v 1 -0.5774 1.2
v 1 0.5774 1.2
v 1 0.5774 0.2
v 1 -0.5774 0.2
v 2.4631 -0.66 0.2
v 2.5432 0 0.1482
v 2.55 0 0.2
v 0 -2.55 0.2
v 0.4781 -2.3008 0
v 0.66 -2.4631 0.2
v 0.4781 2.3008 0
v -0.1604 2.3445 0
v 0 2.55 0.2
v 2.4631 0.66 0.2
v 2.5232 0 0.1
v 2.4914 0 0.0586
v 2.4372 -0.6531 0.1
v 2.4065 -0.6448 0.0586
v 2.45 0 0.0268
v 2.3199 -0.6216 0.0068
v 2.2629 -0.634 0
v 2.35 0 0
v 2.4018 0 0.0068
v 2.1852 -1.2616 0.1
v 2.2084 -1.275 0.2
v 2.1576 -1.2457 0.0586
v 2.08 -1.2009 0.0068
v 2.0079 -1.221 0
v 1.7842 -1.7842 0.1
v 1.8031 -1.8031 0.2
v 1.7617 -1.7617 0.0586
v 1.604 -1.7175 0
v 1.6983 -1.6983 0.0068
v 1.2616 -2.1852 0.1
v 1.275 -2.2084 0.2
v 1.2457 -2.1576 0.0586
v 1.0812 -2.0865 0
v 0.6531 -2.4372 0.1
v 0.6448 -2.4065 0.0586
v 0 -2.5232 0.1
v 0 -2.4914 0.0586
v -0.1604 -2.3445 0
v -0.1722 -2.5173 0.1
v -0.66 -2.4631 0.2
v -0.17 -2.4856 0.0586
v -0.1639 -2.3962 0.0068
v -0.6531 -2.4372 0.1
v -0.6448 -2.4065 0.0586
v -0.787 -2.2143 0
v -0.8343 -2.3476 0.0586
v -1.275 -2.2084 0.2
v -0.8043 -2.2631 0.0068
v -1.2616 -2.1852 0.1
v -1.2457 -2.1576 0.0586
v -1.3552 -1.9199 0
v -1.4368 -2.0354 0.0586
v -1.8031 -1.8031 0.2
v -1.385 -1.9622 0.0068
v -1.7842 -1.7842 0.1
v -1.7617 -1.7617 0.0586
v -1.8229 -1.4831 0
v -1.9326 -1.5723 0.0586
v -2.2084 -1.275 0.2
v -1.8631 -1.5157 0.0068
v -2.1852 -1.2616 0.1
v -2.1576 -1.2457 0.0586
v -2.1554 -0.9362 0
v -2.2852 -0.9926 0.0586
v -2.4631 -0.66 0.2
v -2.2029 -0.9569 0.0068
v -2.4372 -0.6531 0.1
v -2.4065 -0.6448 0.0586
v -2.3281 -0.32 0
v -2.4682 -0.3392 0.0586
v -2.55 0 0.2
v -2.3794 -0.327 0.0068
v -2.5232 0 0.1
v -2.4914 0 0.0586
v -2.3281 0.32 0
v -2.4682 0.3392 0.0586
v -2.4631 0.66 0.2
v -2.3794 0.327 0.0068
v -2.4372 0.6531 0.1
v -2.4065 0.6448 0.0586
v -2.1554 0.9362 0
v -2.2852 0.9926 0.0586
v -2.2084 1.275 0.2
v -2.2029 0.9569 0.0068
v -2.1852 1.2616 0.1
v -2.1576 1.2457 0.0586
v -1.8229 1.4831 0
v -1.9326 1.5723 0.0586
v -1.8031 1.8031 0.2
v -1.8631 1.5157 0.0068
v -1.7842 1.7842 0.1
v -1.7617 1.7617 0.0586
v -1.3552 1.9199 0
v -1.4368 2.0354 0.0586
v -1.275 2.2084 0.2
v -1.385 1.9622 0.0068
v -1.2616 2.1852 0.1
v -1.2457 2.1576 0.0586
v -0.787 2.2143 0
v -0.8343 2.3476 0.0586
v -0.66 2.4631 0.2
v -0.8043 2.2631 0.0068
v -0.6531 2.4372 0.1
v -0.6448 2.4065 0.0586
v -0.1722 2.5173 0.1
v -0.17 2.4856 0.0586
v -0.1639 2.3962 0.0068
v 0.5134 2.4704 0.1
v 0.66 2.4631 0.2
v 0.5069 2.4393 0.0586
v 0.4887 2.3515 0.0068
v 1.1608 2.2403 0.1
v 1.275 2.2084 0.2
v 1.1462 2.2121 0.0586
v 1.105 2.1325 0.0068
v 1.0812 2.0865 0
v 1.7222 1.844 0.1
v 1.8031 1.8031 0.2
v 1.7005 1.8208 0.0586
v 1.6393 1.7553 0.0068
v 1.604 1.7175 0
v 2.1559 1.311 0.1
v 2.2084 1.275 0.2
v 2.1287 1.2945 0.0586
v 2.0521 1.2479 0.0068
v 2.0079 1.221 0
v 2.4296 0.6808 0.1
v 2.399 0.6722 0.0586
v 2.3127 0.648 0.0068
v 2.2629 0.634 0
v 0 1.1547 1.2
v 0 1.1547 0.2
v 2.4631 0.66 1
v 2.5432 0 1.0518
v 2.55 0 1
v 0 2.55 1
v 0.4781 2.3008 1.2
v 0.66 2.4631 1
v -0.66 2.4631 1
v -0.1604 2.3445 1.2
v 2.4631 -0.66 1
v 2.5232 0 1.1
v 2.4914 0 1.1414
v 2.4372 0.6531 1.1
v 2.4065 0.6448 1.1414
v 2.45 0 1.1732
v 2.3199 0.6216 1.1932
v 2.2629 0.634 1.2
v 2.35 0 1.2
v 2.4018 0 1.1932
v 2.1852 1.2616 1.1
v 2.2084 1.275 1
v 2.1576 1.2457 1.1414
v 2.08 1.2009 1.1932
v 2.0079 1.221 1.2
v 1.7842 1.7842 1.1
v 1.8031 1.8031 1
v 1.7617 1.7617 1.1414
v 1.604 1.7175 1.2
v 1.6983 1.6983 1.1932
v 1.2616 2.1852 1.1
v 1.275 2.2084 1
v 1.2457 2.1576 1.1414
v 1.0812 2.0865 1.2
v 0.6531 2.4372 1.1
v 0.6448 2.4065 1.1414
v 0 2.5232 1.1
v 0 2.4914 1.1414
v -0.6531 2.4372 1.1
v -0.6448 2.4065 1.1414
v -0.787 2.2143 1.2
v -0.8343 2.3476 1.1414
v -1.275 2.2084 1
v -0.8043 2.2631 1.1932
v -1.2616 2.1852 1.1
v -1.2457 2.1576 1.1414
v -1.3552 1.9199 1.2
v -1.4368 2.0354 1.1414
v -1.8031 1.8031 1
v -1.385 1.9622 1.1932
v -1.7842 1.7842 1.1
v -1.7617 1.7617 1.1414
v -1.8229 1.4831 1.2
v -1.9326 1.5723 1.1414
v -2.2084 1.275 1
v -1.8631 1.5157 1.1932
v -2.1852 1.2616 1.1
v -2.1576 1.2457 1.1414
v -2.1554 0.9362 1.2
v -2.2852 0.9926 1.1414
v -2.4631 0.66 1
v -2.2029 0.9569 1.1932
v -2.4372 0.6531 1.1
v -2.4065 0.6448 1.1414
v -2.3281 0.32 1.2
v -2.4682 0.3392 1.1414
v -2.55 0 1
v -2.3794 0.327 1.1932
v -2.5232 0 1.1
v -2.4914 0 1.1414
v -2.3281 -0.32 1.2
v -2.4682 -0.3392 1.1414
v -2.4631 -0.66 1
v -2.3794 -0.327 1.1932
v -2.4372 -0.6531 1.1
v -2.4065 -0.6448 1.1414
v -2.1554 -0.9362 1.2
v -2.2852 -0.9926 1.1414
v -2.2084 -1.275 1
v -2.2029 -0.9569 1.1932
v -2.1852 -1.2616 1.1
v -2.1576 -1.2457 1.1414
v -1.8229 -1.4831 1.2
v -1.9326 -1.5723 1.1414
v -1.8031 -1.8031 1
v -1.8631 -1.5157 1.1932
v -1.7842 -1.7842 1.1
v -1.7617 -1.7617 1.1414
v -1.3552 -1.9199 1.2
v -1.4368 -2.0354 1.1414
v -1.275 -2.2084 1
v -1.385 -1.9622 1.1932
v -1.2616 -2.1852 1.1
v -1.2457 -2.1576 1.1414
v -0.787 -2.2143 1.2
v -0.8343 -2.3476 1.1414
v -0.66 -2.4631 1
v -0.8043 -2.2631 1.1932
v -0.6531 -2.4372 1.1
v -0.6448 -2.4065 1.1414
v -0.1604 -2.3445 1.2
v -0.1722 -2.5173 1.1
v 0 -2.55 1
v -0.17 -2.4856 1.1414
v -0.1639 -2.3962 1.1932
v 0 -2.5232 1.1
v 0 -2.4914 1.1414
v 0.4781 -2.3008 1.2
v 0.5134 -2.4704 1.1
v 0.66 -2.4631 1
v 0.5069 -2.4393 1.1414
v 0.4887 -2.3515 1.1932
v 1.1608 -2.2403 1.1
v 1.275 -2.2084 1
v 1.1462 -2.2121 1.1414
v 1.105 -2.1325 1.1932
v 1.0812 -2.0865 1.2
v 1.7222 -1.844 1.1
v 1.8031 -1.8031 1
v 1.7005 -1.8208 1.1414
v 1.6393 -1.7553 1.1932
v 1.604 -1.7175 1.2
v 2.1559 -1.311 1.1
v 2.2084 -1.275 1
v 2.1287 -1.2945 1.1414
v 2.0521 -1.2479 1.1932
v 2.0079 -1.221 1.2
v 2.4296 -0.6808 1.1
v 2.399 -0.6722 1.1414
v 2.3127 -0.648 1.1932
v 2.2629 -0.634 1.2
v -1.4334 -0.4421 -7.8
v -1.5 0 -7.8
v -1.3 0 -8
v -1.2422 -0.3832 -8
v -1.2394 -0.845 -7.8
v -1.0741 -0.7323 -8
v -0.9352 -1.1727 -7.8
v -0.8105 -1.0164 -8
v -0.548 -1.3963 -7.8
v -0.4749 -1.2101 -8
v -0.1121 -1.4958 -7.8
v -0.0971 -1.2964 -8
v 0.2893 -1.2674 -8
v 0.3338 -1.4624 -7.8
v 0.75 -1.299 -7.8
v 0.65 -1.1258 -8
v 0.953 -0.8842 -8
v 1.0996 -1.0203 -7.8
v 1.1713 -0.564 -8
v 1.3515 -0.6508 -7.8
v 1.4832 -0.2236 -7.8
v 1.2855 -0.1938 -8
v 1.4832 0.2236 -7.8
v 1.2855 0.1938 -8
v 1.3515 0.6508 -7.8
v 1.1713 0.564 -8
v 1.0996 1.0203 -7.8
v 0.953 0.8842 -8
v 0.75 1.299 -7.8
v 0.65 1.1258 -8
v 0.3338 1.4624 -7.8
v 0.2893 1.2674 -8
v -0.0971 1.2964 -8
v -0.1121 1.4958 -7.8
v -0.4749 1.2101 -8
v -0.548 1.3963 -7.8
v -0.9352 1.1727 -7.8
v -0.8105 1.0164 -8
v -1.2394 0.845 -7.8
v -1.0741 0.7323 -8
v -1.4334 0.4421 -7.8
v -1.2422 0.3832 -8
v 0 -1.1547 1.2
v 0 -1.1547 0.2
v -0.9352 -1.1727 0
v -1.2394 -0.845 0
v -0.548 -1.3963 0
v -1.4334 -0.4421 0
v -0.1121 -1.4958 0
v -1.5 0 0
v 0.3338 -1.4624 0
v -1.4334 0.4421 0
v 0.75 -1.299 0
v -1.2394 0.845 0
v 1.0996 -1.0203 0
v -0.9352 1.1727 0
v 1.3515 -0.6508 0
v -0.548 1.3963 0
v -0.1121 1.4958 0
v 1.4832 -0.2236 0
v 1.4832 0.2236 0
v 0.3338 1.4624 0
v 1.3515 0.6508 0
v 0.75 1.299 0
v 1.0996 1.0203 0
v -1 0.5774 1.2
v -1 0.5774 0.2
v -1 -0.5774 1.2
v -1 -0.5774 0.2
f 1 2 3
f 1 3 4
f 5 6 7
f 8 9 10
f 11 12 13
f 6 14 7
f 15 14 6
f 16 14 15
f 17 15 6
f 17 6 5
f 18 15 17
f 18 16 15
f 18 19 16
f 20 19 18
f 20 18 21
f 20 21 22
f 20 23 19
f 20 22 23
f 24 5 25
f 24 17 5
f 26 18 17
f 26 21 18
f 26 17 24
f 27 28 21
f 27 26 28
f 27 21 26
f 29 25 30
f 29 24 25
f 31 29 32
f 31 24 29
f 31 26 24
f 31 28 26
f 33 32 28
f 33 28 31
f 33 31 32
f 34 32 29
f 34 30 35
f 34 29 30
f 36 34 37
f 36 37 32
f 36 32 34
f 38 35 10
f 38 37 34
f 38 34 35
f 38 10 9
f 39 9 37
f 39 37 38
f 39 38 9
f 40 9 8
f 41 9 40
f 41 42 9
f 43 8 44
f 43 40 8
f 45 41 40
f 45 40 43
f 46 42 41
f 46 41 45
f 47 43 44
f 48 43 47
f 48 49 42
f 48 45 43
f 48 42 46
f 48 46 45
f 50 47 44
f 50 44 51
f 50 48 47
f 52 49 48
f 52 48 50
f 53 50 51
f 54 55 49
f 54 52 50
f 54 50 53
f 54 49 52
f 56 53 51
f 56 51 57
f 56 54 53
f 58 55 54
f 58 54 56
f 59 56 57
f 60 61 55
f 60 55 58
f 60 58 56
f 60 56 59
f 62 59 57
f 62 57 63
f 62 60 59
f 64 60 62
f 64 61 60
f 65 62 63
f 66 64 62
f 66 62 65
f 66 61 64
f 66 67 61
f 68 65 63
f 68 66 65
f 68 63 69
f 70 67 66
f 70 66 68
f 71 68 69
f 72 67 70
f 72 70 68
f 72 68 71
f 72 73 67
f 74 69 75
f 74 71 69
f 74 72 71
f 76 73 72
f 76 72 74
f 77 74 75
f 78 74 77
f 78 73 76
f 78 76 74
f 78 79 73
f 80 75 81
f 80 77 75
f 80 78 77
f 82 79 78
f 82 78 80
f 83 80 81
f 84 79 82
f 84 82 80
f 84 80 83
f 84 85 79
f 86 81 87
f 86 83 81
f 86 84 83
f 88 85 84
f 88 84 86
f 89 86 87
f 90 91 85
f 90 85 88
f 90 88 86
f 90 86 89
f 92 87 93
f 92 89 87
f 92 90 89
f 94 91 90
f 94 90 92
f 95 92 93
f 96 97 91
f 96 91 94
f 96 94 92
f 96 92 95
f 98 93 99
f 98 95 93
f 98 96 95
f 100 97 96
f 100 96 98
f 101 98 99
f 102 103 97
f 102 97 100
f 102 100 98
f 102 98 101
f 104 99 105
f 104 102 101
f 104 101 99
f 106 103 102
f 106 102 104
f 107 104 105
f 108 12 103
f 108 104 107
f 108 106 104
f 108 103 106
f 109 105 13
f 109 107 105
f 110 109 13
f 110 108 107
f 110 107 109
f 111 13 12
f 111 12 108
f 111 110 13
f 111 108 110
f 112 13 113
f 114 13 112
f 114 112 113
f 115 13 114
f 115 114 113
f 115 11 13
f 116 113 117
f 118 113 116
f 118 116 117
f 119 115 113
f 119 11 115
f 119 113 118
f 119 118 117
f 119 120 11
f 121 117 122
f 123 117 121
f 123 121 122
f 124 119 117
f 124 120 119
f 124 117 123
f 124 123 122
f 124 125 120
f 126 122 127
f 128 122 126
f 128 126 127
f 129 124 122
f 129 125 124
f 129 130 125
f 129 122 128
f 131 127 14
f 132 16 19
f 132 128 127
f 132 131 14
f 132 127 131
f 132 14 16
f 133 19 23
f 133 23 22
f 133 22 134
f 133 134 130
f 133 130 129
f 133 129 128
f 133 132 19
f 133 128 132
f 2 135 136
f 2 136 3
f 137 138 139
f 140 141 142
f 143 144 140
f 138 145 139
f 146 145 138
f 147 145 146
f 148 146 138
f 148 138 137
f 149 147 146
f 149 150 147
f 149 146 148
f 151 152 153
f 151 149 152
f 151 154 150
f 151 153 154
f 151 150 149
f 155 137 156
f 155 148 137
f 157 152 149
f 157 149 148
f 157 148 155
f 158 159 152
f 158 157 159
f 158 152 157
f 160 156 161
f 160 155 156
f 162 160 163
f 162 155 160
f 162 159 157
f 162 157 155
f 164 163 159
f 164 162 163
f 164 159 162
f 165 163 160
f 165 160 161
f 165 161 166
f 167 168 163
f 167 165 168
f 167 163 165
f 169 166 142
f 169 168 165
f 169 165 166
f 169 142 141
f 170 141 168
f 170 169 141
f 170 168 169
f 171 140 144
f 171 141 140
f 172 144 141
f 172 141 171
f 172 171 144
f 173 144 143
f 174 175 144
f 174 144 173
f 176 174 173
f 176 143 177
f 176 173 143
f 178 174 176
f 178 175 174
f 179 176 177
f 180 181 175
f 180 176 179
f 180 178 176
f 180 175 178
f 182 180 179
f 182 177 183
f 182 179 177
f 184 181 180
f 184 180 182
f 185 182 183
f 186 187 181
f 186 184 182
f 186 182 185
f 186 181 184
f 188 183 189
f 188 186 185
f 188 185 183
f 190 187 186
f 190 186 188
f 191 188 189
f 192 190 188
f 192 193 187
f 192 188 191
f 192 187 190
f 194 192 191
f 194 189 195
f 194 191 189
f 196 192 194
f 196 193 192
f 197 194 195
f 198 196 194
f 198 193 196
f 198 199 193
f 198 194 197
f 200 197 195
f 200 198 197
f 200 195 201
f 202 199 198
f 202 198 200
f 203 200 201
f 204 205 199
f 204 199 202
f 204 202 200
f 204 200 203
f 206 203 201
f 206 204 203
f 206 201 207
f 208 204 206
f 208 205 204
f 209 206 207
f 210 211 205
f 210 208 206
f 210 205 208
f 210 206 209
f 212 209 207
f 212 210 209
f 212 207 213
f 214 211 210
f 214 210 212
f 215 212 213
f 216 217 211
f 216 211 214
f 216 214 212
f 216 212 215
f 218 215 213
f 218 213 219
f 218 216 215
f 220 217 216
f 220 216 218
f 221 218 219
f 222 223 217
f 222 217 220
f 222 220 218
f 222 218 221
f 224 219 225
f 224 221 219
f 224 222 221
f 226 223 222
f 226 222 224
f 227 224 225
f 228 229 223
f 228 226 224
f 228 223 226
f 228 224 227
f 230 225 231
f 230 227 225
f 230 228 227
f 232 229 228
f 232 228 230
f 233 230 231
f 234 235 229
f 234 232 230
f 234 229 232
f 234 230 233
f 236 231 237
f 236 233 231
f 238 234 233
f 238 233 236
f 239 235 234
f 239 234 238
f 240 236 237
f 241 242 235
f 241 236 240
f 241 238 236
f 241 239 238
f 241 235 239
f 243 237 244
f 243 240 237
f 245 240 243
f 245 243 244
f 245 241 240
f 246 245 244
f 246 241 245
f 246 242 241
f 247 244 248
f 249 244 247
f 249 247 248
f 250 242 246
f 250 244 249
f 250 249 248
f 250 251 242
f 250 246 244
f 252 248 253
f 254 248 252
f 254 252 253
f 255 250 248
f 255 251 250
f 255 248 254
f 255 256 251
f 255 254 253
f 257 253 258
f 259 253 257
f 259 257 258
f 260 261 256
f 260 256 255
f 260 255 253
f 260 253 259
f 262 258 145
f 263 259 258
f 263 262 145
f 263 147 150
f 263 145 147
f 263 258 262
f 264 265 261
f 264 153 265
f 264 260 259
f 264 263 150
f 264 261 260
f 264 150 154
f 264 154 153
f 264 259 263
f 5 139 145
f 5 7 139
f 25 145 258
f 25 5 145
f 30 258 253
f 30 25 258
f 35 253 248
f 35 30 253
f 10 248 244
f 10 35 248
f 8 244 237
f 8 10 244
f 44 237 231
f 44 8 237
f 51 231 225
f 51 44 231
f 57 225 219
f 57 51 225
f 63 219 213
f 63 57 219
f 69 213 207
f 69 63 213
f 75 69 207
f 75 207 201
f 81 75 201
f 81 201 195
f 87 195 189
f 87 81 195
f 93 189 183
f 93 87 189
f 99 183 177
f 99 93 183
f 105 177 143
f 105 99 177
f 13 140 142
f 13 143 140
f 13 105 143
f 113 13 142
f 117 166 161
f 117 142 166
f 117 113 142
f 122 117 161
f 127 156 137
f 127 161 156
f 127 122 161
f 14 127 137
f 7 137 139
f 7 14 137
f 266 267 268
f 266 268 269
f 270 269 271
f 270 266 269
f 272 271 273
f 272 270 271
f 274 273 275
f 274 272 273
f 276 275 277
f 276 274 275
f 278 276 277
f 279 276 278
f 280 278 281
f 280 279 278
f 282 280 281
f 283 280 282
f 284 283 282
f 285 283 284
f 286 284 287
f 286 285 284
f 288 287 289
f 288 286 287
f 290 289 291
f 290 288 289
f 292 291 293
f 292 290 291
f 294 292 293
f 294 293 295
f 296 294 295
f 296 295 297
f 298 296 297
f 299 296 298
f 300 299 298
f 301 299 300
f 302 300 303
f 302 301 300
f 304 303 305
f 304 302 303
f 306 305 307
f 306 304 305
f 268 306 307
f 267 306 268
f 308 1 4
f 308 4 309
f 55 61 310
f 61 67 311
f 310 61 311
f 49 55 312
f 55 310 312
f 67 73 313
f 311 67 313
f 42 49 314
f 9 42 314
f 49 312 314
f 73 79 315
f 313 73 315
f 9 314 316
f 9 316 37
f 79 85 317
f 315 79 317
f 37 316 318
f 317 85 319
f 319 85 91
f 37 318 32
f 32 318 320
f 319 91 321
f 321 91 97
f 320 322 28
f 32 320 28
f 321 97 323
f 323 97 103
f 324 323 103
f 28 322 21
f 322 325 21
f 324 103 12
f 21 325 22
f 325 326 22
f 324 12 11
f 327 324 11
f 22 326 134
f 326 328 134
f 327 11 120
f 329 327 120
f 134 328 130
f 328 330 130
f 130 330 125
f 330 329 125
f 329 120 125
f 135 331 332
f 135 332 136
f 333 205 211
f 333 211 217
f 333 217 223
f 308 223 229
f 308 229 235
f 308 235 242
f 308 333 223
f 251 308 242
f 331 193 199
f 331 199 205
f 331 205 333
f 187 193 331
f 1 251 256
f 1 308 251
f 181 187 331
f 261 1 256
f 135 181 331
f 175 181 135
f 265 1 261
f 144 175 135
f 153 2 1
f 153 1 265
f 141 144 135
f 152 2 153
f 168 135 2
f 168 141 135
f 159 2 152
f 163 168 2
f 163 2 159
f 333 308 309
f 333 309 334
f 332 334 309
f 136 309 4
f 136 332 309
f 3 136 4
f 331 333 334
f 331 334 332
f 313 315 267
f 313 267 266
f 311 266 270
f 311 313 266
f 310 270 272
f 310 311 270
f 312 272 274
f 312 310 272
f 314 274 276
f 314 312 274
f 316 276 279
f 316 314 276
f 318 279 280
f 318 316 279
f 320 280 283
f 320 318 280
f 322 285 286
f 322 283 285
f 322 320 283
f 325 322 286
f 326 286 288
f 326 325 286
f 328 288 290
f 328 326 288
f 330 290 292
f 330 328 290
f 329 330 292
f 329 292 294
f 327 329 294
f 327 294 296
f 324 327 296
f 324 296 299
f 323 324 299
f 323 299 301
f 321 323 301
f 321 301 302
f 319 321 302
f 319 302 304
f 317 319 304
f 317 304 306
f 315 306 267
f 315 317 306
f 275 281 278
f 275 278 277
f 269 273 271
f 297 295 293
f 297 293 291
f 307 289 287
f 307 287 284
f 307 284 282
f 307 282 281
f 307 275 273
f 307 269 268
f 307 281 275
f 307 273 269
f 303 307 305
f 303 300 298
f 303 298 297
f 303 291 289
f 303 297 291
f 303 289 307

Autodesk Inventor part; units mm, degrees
ref_plane "YZ Plane" through (0, 0, 0) normal (1, 0, 0) x (0, 1, 0)
ref_plane "XZ Plane" through (0, 0, 0) normal (0, 1, 0) x (-1, 0, 0)
ref_plane "XY Plane" through (0, 0, 0) normal (0, 0, 1) x (1, 0, 0)
sketch "スケッチ1" plane through (0, 0, 0) normal (0, 0, 1) x (1, 0, 0)
  circle A0 centre (0, 0) radius 2.55
  dimension "d0" = 5.1
extrude "押し出し1" add sketch "スケッチ1" along normal blind 1.2
sketch "スケッチ2" plane through (0, 0, 0) normal (0, 0, -1) x (-1, 0, 0)
  circle A0 centre (0, 0) radius 2.55 projected
  circle A1 centre (0, 0) radius 1.5
  dimension "d3" = 3
extrude "押し出し2" add sketch "スケッチ2" along normal blind 8 contours A1
thread "ねじ1" size "M3x0.5" class "6g" standard "ANSI Metric M Profile" full length
sketch "スケッチ3" plane through (0, 0, 1.2) normal (0, 0, 1) x (1, 0, 0)
  circle A0 centre (0, 0) radius 2.55 projected
  line L0 (0, 1.1547) -> (1, 0.5774)
  line L1 (1, 0.5774) -> (1, -0.5774)
  line L2 (1, -0.5774) -> (0, -1.1547)
  line L3 (0, -1.1547) -> (-1, -0.5774)
  line L4 (-1, -0.5774) -> (-1, 0.5774)
  line L5 (-1, 0.5774) -> (0, 1.1547)
  dimension "d8" = 2
extrude "押し出し3" cut sketch "スケッチ3" against normal blind 1 contours L0 L1 L2 L3 L4 L5
fillet "フィレット1" radius 0.2 2 edges at (-2.55, 0, 1.2) (-2.55, 0, 0)
chamfer "面取り1" distance 0.2 angle 45 1 edges at (1.5, 0, -8)
properties part number "六角穴付低頭平 M3 x 8" material "鋼"
